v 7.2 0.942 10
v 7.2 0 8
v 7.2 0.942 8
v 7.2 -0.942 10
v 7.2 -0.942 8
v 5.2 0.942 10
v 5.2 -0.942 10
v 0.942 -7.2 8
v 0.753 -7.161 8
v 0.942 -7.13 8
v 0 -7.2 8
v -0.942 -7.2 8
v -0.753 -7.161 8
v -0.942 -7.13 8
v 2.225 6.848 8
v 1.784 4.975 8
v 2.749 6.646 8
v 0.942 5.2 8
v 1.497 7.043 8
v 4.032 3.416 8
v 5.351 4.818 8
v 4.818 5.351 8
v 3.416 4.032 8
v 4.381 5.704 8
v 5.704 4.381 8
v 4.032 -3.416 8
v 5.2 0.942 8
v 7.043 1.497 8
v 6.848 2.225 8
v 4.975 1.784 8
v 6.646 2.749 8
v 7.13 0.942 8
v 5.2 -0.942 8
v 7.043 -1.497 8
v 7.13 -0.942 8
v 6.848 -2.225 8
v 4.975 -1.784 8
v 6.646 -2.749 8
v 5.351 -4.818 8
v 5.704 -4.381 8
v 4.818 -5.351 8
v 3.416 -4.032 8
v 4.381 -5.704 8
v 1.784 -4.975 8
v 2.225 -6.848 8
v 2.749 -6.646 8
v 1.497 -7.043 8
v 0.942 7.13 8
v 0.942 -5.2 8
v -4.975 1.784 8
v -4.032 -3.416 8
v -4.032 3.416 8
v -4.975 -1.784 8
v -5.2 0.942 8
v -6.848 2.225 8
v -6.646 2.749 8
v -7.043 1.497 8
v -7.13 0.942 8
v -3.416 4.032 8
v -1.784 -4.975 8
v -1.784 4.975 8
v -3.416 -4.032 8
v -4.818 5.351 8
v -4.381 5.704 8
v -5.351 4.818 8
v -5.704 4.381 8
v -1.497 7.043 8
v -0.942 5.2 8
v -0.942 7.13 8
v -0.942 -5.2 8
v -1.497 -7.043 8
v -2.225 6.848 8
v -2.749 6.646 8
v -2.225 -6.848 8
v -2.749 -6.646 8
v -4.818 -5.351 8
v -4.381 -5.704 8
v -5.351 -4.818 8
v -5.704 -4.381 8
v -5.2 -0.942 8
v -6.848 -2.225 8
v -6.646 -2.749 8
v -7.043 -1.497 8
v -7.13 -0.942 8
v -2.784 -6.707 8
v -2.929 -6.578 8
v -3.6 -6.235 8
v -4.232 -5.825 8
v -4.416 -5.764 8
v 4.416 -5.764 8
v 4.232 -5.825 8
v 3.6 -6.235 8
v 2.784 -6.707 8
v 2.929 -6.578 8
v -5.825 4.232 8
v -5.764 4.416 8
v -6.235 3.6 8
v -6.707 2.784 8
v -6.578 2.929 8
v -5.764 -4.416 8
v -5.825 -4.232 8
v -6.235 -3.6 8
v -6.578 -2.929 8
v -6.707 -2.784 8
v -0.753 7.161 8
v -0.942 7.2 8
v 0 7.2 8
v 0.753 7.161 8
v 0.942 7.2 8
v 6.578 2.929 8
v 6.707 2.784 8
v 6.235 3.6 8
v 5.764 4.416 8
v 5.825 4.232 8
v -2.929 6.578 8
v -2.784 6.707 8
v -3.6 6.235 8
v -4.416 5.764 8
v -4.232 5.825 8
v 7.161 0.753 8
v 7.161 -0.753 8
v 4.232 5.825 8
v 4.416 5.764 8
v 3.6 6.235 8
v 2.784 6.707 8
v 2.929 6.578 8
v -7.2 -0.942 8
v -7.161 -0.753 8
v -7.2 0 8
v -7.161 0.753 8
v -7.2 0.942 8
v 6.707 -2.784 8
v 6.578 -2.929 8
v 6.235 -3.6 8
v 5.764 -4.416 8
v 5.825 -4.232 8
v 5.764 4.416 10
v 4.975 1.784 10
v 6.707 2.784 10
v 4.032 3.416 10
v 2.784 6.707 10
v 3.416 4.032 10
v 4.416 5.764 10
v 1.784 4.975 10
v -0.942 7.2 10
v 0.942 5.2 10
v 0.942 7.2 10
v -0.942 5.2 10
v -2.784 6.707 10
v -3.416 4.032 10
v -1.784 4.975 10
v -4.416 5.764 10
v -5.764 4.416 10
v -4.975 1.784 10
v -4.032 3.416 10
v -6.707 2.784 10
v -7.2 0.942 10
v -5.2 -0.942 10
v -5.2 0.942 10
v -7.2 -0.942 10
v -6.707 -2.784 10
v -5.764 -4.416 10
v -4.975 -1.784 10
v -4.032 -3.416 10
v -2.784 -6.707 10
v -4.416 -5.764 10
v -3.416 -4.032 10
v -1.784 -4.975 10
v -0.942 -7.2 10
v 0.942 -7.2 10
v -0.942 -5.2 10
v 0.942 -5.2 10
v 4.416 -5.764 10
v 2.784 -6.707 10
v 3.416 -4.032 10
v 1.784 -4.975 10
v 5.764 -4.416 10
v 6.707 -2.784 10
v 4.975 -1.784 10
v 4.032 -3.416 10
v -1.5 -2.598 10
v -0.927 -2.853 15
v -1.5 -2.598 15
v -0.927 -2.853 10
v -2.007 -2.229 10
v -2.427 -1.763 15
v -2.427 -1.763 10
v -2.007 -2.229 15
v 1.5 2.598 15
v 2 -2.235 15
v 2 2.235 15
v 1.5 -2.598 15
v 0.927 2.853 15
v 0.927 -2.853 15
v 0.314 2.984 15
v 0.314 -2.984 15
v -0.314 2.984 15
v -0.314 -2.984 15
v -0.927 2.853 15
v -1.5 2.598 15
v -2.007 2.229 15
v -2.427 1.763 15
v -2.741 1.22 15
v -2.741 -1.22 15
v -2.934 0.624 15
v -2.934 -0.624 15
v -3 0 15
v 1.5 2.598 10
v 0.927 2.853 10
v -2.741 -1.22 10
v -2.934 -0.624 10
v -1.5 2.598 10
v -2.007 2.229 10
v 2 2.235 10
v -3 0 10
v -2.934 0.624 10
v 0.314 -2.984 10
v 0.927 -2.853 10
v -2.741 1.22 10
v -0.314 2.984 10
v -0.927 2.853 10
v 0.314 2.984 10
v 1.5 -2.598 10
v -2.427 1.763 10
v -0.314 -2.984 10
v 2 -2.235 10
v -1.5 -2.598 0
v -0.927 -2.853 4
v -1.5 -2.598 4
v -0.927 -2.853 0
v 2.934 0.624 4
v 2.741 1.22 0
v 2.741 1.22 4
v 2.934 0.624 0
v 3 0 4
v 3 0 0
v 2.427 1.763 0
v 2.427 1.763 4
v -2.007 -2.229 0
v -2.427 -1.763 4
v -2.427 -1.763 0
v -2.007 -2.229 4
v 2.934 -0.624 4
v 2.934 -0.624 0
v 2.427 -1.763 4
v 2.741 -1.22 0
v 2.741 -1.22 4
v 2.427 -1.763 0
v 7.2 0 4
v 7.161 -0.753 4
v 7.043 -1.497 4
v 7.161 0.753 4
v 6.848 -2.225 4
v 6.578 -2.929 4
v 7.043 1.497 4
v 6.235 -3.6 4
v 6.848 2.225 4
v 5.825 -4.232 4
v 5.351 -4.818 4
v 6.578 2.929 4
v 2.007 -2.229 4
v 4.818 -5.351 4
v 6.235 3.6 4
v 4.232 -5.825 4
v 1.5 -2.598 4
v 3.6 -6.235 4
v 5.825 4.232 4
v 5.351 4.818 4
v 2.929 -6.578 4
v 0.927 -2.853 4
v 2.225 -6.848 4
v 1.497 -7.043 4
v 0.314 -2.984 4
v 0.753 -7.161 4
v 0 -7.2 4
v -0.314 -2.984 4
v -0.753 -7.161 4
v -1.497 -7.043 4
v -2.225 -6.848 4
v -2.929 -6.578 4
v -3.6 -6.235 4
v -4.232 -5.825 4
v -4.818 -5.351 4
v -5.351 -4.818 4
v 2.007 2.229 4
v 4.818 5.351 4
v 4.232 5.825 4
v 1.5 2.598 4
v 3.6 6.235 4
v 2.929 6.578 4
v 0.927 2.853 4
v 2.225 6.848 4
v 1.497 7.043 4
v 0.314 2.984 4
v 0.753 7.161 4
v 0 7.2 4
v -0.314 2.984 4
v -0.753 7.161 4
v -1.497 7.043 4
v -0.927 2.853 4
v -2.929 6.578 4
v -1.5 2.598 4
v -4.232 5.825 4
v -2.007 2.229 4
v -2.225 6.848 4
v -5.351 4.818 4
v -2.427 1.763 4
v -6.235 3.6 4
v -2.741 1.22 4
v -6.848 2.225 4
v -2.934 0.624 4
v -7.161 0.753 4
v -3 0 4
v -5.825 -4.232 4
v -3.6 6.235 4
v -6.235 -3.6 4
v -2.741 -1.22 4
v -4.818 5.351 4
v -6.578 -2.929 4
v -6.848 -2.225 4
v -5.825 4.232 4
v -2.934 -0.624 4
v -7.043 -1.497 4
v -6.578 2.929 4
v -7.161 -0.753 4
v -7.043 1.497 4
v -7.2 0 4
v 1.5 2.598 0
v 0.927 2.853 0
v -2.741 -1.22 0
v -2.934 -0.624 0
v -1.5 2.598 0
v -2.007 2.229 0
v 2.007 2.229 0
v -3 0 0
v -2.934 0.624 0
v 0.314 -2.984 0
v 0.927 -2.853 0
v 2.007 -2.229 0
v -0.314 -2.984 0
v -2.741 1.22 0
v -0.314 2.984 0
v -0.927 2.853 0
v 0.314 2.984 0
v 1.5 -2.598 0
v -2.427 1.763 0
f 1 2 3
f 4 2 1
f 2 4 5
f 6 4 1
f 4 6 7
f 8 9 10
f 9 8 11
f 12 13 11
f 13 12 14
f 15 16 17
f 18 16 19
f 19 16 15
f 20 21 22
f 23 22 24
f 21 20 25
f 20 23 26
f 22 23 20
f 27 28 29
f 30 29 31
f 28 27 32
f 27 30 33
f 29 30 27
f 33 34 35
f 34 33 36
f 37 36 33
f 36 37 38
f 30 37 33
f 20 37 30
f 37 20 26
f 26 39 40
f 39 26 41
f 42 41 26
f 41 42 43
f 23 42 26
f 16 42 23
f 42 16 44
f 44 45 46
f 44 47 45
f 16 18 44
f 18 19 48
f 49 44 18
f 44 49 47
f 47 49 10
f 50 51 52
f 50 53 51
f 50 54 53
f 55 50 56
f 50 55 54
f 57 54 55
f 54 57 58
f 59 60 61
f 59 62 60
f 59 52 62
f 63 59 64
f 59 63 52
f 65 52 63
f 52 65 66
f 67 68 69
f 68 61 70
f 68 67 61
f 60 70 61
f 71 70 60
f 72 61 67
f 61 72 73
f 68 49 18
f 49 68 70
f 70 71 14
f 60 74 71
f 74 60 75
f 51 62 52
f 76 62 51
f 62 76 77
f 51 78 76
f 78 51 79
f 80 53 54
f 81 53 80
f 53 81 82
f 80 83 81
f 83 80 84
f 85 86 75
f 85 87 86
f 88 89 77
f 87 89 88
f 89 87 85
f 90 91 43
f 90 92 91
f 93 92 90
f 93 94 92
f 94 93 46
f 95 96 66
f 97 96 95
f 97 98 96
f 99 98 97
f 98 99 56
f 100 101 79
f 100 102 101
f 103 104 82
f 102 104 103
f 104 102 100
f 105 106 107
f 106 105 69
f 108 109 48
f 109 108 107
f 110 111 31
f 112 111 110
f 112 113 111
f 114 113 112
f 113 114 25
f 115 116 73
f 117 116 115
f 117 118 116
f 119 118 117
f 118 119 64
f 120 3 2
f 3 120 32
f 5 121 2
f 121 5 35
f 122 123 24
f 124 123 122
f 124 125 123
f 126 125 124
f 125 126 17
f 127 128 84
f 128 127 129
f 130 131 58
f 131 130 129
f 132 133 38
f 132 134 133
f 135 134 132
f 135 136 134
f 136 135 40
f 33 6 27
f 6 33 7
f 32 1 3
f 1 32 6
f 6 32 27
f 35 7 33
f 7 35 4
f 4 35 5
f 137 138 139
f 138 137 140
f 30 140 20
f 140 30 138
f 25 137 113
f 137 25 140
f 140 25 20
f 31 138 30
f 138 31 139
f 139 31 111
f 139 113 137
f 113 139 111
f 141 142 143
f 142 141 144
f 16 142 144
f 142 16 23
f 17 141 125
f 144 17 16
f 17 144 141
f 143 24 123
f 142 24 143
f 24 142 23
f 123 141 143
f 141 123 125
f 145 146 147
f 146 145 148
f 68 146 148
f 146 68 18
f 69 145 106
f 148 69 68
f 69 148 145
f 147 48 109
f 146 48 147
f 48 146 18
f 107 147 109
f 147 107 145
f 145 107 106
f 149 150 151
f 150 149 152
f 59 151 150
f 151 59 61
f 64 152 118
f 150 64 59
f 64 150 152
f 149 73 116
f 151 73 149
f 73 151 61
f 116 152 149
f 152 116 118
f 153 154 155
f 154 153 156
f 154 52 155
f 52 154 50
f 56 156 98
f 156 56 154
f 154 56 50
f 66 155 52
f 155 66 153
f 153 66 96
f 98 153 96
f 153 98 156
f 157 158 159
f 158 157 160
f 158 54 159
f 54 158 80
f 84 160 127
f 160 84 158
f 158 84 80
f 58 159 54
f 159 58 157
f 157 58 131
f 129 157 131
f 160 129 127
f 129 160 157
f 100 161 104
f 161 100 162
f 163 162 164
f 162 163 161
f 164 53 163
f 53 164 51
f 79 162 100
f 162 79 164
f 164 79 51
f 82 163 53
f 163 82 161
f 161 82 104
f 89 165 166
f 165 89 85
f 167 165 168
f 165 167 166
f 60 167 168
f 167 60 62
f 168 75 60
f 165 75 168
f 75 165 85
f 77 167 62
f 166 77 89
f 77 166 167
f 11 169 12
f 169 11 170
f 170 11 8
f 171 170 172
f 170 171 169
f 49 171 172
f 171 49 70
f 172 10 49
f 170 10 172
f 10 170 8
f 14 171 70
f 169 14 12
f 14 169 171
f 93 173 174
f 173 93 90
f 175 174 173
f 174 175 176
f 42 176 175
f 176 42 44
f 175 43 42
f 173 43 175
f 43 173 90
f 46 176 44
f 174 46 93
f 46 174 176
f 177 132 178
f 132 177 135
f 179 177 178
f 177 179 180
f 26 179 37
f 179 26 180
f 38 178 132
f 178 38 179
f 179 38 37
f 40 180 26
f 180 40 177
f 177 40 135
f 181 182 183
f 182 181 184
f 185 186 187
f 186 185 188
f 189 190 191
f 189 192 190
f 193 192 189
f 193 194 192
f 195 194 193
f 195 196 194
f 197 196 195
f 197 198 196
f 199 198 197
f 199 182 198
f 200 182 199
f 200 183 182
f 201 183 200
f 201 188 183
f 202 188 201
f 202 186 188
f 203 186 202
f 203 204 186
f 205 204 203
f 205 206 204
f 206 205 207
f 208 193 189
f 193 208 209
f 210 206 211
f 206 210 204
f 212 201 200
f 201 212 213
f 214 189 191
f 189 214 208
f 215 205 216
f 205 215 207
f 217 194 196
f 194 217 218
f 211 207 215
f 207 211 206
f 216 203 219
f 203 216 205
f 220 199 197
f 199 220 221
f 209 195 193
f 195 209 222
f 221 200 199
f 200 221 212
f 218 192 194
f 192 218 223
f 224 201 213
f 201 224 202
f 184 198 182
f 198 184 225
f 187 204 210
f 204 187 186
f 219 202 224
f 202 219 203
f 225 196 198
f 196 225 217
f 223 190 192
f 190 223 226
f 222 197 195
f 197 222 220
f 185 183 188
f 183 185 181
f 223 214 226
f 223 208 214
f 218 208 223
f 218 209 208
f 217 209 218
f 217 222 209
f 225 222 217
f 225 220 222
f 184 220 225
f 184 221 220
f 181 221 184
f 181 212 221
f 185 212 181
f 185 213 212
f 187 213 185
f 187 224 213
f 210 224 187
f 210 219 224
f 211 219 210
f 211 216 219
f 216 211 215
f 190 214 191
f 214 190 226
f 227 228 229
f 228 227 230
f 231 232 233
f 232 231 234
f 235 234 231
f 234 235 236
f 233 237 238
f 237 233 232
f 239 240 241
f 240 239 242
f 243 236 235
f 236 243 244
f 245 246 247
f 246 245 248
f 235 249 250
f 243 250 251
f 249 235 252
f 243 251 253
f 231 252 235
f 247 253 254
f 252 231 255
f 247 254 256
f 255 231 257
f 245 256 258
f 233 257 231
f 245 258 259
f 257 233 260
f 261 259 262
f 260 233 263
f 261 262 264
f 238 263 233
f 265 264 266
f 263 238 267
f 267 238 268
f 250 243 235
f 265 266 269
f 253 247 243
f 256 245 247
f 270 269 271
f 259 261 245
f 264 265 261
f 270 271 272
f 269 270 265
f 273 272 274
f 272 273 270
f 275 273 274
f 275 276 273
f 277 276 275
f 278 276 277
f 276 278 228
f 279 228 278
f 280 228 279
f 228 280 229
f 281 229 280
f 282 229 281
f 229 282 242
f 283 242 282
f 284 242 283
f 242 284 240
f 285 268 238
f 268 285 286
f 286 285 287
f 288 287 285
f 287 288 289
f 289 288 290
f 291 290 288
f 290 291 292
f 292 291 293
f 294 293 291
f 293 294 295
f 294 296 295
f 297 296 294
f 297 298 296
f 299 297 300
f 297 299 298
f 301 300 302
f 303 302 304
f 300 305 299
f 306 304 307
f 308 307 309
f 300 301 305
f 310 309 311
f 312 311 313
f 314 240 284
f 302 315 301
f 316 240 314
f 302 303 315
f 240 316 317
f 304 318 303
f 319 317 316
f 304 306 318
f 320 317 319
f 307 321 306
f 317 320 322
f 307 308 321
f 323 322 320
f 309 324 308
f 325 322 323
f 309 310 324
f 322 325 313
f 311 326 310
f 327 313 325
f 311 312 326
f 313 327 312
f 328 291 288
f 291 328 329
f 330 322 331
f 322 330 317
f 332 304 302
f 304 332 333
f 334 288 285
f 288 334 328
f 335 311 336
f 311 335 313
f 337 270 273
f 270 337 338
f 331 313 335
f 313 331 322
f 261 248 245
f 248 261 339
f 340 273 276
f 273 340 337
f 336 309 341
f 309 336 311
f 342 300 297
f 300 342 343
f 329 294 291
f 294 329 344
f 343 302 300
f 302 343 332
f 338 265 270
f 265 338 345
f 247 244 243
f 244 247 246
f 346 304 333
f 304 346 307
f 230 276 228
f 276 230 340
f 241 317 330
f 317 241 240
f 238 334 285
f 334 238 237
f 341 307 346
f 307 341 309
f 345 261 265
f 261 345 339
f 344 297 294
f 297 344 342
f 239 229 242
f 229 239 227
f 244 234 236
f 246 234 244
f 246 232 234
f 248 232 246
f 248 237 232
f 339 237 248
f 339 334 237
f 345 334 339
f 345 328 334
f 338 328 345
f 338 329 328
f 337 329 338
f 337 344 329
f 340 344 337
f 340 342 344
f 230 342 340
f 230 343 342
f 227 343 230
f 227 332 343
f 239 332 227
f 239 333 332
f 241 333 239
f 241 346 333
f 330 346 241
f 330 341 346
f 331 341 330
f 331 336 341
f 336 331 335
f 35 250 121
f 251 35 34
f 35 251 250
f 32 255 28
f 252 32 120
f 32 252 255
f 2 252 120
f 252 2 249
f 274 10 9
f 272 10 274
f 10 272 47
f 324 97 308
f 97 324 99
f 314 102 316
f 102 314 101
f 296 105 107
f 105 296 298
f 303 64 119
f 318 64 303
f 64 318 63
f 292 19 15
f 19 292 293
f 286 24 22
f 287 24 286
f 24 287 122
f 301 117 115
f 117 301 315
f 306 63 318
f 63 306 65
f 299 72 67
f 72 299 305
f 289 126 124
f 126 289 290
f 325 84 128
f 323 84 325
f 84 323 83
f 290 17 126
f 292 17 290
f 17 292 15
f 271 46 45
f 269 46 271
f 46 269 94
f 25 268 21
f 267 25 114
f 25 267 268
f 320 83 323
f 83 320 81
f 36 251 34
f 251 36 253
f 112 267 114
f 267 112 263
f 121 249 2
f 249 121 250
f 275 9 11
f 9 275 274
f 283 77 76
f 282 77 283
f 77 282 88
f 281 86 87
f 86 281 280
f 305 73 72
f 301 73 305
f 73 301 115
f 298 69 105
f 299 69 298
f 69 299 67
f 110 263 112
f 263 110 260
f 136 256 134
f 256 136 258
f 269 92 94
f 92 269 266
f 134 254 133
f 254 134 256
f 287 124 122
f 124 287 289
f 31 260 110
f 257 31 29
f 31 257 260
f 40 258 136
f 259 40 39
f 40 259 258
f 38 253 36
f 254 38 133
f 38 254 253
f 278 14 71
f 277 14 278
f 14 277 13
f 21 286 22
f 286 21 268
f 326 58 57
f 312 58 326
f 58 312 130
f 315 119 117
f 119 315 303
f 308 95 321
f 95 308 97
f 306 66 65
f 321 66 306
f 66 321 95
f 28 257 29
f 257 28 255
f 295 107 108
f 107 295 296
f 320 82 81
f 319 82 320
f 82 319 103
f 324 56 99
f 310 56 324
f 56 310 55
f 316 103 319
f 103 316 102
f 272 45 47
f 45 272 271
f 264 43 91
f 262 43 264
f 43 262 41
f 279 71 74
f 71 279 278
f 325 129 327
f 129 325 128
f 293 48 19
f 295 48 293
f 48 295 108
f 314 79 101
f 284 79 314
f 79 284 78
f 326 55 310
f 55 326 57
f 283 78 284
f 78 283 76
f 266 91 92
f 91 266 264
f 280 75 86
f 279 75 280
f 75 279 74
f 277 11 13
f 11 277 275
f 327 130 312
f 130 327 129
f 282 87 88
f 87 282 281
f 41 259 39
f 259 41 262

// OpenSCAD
use <carousel.scad>
// Shift up 4mm so disc base sits on bed, nub points up
translate([0, 0, 4])
    crown_gear();
